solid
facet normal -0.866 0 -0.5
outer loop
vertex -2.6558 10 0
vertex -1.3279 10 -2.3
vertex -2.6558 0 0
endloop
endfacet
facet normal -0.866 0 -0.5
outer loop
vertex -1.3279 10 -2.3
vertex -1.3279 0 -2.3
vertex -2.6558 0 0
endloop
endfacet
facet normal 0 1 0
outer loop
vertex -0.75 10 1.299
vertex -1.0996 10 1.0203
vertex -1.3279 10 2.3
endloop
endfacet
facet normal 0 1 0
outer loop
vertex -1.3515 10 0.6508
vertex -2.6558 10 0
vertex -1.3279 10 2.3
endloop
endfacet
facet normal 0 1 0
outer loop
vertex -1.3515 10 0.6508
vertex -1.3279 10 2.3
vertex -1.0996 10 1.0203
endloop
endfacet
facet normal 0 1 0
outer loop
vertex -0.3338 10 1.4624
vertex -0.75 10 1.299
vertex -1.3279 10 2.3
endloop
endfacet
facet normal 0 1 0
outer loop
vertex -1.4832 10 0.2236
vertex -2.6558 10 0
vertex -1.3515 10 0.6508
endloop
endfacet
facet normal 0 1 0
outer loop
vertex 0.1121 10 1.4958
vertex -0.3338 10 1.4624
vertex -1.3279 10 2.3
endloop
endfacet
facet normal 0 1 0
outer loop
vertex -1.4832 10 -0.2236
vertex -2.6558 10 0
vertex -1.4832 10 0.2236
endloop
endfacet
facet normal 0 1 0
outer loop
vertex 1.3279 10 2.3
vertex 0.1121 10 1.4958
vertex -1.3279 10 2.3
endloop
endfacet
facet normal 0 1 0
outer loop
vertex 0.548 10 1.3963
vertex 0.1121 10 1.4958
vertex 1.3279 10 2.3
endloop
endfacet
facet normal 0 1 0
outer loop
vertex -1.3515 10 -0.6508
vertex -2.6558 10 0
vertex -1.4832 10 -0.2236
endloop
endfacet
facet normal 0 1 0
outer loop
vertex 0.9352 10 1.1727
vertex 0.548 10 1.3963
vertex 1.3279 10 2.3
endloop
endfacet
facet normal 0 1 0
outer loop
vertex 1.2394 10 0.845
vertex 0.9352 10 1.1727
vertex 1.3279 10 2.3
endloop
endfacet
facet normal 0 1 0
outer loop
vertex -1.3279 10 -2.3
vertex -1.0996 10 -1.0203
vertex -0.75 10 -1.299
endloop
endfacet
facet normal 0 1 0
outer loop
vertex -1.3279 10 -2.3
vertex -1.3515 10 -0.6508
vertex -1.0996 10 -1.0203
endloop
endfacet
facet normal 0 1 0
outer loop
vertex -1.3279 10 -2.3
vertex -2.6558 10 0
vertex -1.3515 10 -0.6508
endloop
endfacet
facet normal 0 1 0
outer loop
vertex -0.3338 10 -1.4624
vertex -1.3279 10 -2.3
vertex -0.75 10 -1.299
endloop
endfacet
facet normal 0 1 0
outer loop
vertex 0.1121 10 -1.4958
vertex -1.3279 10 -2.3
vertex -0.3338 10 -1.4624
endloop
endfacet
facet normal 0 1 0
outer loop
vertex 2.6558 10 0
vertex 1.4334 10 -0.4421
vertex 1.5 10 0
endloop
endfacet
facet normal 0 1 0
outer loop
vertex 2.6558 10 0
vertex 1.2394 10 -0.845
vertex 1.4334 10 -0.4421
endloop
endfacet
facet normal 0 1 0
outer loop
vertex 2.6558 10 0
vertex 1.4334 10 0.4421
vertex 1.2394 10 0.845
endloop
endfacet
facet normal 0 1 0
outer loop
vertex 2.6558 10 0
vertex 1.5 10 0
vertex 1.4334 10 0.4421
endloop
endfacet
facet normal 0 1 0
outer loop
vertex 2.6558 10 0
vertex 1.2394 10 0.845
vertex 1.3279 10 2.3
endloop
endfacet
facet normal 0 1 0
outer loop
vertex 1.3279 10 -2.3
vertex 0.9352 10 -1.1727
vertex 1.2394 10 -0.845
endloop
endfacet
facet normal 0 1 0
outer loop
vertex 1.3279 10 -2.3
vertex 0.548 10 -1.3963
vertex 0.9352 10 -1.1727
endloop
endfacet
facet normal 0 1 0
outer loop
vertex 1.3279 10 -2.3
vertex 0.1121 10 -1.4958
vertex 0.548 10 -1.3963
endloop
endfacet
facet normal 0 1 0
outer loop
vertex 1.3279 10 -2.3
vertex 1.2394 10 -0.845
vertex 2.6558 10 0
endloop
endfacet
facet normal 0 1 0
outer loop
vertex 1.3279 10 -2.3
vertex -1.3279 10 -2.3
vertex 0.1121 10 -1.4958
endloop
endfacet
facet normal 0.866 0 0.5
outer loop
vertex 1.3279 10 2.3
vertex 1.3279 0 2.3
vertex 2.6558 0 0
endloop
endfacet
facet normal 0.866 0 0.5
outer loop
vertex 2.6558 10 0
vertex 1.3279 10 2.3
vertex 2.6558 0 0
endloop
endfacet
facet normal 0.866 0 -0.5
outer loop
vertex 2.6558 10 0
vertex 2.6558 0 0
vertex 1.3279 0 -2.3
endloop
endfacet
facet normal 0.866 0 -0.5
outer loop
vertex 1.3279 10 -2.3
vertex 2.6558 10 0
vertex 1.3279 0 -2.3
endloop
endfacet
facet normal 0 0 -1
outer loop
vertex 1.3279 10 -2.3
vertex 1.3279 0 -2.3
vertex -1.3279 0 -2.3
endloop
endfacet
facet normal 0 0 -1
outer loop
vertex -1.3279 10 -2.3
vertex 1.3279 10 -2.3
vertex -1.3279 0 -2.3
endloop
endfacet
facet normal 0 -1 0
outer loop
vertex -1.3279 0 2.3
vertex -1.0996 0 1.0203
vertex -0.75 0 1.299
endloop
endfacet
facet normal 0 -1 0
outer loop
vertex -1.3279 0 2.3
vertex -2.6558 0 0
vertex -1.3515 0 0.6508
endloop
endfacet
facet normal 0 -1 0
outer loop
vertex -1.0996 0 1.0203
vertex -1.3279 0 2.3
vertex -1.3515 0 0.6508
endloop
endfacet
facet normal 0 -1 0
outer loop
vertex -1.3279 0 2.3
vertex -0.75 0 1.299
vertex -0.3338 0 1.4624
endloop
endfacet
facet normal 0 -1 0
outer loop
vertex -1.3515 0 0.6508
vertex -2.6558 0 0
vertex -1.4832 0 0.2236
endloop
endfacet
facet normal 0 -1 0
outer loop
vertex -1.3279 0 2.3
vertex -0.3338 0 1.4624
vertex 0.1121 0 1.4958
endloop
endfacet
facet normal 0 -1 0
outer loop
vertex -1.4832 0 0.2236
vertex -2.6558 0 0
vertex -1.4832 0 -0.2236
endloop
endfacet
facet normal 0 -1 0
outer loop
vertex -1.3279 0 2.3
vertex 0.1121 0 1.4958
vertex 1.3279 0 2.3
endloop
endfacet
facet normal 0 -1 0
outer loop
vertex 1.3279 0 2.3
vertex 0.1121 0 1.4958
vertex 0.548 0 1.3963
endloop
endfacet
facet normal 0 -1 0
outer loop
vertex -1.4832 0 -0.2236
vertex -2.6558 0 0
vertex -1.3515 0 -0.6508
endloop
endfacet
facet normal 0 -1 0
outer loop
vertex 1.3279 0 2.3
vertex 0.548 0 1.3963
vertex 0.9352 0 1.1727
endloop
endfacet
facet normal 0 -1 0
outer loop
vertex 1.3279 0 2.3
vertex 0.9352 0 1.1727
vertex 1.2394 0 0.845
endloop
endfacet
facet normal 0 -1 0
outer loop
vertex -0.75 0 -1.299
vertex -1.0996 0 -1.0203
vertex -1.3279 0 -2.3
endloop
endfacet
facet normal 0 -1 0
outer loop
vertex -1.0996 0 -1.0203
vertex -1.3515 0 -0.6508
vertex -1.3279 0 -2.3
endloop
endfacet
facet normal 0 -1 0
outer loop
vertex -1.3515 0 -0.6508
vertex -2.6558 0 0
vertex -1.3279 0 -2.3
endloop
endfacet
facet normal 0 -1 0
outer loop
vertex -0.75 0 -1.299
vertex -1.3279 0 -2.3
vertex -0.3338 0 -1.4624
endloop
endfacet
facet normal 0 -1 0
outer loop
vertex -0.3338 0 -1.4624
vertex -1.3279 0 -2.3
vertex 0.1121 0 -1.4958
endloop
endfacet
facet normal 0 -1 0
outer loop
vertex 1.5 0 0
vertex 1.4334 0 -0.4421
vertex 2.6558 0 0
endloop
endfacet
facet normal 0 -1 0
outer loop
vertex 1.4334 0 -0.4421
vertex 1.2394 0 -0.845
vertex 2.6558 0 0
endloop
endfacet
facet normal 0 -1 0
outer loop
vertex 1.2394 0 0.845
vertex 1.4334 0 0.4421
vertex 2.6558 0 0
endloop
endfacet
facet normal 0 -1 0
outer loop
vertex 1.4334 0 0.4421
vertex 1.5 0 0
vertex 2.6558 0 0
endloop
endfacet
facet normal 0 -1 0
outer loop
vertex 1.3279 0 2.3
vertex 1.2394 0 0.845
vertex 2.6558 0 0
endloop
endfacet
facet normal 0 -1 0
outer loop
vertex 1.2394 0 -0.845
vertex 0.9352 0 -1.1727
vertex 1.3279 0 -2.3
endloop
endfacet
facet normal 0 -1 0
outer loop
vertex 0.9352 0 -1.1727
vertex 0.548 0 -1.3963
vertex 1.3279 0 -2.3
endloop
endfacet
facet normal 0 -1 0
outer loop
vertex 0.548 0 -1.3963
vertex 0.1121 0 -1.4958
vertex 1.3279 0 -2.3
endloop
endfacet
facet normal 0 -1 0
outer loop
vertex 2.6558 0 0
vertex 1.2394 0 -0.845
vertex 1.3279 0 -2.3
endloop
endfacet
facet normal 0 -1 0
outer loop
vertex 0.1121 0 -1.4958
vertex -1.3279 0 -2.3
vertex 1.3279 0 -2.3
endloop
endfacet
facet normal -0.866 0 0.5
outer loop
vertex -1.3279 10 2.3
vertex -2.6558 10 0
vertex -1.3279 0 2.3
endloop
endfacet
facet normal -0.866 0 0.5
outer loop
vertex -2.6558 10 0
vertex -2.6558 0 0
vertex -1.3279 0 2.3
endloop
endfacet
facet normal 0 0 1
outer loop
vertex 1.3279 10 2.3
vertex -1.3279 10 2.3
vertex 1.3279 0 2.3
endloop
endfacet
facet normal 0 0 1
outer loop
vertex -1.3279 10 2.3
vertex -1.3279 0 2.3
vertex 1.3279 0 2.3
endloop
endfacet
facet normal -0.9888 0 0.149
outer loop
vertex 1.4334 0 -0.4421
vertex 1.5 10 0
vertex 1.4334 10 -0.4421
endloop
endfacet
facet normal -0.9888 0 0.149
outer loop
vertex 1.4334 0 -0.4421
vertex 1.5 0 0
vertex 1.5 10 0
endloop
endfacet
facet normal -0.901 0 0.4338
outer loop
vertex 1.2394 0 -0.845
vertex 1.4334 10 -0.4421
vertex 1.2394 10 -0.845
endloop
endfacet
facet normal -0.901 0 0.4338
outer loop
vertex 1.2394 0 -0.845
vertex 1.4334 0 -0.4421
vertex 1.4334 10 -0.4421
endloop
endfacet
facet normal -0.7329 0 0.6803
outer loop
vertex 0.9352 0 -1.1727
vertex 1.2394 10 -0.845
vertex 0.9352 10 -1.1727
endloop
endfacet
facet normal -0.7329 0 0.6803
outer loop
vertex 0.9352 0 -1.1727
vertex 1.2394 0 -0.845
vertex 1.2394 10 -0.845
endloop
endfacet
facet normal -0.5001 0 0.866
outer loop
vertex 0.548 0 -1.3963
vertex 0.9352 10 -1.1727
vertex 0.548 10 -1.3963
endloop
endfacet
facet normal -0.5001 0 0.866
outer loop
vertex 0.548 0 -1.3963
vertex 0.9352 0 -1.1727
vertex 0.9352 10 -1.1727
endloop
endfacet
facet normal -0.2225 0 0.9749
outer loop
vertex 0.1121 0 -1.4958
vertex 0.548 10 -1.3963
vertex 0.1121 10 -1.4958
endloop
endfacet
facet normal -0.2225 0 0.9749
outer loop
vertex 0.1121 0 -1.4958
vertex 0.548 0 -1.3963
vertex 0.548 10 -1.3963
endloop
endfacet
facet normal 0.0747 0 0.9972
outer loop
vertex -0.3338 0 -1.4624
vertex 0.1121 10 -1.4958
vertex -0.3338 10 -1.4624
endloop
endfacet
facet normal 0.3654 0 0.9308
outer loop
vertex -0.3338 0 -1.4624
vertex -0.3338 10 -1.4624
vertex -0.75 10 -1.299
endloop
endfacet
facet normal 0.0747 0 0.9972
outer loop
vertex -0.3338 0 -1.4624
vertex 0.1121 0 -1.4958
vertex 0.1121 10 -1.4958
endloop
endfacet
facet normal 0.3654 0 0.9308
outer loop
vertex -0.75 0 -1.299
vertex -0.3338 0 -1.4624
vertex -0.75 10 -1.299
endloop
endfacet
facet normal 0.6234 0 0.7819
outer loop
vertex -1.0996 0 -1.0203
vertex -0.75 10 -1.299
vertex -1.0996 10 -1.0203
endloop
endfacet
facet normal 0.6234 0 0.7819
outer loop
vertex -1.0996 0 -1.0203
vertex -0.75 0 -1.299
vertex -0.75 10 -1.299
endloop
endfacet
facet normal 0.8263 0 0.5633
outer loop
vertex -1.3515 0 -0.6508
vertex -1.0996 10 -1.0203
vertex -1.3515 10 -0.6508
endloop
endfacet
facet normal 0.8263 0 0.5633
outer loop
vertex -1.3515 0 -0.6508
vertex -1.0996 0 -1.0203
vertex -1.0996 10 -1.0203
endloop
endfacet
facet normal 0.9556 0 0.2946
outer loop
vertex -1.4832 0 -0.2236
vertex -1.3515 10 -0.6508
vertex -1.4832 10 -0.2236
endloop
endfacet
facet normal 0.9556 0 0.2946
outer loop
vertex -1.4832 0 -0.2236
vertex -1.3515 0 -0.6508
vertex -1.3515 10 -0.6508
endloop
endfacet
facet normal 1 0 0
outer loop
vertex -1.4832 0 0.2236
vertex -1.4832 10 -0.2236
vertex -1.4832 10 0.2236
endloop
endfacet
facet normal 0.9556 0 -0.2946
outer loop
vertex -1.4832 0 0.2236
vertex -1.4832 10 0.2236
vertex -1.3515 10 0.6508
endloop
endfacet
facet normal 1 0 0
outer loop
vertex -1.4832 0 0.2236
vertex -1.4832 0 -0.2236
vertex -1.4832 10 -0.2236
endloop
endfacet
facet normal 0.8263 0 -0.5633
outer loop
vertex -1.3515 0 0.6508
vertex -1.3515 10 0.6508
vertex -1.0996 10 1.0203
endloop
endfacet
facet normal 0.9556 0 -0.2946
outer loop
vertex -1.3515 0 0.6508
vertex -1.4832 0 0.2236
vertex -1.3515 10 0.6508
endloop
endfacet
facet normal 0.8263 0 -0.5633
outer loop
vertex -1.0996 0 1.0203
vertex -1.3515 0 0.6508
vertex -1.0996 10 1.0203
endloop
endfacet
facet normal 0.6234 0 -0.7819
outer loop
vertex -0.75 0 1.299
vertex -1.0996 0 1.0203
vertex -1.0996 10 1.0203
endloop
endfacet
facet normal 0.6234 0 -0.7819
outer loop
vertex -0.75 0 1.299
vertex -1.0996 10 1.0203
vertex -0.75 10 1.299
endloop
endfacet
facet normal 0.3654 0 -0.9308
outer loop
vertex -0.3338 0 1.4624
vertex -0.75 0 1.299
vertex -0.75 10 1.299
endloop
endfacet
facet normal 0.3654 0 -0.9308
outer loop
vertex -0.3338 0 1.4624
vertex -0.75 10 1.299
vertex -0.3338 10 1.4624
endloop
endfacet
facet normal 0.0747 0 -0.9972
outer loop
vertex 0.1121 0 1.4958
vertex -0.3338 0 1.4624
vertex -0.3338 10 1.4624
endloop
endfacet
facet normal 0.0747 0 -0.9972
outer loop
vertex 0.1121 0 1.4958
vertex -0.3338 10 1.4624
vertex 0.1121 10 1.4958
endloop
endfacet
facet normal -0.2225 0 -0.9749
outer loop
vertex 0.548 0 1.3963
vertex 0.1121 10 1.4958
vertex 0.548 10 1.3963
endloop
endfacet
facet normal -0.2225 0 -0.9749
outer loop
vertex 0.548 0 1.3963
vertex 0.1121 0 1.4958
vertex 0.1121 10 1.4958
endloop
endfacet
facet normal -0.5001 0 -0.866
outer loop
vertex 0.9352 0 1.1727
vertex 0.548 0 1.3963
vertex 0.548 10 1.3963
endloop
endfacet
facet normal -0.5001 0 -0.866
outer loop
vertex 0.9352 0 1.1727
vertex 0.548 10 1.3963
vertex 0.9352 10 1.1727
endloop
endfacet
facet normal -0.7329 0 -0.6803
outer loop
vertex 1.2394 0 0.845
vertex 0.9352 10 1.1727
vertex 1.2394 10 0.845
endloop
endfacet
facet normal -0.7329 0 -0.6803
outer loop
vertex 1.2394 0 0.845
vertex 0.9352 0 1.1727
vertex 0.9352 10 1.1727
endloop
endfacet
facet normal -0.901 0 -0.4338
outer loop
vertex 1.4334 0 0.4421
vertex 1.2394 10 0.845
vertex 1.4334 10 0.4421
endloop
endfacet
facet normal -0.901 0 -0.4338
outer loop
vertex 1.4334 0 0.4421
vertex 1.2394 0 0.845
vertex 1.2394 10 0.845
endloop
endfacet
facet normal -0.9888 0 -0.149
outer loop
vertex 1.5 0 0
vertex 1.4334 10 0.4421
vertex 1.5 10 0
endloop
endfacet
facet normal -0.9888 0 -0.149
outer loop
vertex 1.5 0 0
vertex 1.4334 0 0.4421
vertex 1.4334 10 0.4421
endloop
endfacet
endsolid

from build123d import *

# Parameters (mm, degrees)
SKETCH_1_R          = 1.5
EXTRUDE_2_DEPTH     = 5
SKETCH1_R           = 1.5
BOSS_EXTRUDE1_DEPTH = 5


with BuildPart() as part:
    # 草图1 → 凸台-拉伸2 (new body)
    with BuildSketch(Plane(origin=(0, 0, 0), x_dir=(1, 0, 0), z_dir=(0, 1, 0))):
        Polygon((-1.327905619, 2.3), (-2.655811238, 0), (-1.327905619, -2.3), (1.327905619, -2.3), (2.655811238, 0), (1.327905619, 2.3), align=None)
        Circle(SKETCH_1_R, mode=Mode.SUBTRACT)
    extrude(amount=EXTRUDE_2_DEPTH)

    # Sketch1 → Boss-Extrude1 (add)
    with BuildSketch(Plane(origin=(0, 5, 0), x_dir=(1, 0, 0), z_dir=(0, 1, 0))):
        Polygon((1.327905619, 2.3), (-1.327905619, 2.3), (-2.655811238, 0), (-1.327905619, -2.3), (1.327905619, -2.3), (2.655811238, 0), align=None)
        Circle(SKETCH1_R, mode=Mode.SUBTRACT)
    extrude(amount=BOSS_EXTRUDE1_DEPTH)


solid = part.part
